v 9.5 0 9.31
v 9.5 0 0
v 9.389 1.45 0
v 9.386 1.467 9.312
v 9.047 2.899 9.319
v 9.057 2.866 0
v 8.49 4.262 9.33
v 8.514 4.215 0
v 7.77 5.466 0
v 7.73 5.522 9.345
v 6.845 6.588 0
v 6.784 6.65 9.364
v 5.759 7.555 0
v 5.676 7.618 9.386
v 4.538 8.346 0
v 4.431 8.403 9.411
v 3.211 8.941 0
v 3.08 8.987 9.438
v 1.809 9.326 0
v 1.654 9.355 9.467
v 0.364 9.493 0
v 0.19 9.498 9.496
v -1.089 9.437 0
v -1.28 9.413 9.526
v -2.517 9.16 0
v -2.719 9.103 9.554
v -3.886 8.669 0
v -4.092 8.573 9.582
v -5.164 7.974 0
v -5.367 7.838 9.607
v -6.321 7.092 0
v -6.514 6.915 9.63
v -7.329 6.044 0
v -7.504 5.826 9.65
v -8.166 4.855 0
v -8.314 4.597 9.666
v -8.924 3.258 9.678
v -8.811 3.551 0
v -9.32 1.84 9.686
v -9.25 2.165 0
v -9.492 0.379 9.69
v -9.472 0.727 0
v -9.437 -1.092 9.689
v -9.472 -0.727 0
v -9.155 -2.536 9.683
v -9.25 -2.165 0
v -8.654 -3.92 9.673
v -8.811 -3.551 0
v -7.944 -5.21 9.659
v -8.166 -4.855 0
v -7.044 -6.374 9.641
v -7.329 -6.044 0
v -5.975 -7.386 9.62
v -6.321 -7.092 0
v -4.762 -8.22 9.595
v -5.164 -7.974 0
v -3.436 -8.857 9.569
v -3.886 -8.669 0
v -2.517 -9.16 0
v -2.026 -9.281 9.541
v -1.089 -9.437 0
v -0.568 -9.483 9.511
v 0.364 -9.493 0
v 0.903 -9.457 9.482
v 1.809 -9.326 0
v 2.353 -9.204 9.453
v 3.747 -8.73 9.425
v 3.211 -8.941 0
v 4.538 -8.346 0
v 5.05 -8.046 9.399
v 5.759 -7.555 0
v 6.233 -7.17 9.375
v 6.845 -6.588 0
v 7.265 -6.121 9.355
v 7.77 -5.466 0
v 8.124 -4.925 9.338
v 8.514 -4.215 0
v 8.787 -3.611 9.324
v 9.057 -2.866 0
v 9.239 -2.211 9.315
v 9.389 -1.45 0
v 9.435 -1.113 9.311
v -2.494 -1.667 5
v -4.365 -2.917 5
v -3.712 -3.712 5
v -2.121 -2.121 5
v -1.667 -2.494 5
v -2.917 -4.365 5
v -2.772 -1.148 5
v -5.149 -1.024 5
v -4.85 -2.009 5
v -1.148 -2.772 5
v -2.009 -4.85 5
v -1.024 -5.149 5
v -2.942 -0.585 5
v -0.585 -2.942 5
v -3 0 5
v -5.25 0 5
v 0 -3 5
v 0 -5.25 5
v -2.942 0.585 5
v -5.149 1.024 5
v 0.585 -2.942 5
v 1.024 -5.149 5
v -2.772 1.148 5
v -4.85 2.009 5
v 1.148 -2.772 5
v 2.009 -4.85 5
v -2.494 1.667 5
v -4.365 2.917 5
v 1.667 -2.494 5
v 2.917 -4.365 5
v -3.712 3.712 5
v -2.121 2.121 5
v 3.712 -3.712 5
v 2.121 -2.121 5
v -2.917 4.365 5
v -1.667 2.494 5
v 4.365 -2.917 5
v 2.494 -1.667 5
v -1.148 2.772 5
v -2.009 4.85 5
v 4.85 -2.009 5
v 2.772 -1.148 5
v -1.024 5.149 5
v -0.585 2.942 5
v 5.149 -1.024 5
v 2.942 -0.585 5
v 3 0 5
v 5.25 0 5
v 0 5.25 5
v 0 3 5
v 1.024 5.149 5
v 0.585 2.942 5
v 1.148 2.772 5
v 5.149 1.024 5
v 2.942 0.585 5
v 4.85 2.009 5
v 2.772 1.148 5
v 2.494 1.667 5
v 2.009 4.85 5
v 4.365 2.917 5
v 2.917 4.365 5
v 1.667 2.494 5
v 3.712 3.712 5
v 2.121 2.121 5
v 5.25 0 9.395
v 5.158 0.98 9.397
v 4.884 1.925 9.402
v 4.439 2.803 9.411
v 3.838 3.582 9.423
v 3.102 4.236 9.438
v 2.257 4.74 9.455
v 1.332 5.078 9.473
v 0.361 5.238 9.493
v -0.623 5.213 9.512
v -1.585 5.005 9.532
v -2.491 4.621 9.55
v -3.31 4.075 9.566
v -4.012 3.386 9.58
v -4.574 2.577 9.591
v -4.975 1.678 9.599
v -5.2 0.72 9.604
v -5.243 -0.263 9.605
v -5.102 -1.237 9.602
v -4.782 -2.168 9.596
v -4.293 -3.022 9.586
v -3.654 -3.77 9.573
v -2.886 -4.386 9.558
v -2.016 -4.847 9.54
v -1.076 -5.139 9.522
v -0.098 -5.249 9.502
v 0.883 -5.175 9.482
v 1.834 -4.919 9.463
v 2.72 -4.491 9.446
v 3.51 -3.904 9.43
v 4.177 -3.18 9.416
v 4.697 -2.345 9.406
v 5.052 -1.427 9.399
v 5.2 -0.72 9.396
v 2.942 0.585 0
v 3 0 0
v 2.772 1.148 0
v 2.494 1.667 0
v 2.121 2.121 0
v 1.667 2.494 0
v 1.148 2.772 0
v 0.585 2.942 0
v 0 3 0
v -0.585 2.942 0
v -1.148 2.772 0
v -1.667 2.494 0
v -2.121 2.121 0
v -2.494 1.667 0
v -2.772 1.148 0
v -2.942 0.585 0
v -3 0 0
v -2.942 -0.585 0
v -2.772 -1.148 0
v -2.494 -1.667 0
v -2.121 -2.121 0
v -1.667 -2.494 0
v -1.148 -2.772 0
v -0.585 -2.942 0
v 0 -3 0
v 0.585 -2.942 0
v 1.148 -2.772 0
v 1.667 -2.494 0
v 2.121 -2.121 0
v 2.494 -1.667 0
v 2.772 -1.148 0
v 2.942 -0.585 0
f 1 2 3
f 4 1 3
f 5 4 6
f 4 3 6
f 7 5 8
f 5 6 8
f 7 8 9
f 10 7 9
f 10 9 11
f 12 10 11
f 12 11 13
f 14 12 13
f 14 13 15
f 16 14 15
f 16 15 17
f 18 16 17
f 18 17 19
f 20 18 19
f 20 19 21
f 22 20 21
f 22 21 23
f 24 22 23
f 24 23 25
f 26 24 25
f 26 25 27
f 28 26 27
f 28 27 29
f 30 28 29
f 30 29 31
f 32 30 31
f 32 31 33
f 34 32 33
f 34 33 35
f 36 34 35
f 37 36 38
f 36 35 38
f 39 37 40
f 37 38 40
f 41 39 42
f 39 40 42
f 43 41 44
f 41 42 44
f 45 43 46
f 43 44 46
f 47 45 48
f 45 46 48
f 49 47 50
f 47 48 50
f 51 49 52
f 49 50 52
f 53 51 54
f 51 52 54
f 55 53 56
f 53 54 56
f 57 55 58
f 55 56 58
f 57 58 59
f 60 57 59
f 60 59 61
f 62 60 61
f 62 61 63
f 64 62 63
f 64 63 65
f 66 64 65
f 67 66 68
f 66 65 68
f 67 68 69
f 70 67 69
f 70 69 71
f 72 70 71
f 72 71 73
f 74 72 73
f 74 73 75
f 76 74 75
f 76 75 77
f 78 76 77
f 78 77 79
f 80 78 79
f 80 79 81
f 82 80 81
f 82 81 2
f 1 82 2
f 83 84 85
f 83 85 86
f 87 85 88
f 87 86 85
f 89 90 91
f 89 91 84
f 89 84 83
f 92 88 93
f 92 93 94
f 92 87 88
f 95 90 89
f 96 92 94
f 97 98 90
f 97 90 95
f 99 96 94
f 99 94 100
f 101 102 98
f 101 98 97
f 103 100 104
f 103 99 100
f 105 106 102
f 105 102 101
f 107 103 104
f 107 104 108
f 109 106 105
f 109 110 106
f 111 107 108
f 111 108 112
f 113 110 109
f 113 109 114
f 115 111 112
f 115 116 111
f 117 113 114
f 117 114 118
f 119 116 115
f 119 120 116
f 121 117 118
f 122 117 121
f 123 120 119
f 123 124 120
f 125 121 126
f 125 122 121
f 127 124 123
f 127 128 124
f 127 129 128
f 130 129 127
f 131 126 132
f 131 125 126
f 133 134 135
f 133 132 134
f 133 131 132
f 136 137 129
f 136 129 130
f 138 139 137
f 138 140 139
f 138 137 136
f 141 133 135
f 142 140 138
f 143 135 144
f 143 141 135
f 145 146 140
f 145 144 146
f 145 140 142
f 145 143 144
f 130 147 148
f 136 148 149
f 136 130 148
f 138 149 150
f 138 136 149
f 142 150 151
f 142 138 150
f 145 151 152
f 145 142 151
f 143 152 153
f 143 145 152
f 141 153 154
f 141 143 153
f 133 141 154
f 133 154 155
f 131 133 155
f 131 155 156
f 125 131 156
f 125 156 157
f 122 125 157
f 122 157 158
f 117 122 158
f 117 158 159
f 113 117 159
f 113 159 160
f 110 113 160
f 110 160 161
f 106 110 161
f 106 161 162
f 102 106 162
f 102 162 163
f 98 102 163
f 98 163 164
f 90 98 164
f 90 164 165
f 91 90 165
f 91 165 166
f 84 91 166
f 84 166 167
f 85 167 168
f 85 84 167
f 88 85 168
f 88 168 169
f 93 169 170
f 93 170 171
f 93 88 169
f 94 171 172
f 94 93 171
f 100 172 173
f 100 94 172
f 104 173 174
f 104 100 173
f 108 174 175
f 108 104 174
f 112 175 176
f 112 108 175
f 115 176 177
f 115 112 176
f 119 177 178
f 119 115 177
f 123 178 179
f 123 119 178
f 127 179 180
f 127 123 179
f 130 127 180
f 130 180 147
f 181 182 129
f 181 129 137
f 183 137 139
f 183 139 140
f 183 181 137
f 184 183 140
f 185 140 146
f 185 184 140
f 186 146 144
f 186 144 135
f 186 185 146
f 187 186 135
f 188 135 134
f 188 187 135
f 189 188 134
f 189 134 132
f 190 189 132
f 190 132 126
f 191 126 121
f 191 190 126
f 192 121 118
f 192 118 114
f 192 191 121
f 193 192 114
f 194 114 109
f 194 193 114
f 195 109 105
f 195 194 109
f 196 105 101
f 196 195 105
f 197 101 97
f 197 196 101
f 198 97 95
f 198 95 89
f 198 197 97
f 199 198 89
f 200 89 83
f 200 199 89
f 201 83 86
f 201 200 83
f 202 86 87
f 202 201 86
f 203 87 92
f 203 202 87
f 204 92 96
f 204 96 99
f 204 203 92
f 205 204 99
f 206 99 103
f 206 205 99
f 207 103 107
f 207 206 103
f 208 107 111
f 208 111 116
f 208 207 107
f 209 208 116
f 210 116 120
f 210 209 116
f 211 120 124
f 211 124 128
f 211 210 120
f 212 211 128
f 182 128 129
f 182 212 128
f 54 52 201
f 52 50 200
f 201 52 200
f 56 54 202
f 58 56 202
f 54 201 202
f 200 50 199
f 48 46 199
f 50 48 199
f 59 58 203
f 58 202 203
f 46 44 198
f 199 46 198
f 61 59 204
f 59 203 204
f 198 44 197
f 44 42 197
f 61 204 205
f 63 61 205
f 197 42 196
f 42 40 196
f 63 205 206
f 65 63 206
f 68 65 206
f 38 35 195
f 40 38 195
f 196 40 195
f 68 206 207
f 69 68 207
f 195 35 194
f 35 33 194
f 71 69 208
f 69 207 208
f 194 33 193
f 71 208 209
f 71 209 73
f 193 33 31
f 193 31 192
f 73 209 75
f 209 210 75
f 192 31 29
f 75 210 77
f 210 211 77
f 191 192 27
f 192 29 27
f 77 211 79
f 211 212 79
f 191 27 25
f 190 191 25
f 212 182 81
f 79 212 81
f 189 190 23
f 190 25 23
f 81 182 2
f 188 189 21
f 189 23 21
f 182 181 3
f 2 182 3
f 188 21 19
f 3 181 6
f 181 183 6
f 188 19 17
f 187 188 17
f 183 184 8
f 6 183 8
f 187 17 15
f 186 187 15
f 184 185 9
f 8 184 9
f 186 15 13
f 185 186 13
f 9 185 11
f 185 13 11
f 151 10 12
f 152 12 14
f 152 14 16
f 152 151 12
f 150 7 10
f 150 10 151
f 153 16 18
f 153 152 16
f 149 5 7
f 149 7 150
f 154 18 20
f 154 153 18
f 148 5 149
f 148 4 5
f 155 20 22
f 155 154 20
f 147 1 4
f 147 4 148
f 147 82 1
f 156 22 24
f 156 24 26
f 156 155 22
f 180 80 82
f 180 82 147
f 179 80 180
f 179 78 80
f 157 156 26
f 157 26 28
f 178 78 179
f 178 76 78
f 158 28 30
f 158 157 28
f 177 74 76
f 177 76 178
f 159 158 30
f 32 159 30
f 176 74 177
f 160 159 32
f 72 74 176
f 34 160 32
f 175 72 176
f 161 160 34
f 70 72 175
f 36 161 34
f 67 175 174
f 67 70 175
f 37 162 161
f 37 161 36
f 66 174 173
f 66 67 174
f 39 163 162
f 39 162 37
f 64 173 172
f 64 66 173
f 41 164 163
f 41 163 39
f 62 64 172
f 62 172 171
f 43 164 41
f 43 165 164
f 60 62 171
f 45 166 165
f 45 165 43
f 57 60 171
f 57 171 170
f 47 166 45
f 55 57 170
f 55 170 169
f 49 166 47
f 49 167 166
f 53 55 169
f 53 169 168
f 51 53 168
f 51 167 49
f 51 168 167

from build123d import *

# Parameters (mm, degrees)
F0_R     = 9.5
F0_R_2   = 5.25
F1_DEPTH = 10
F2_R     = 5.25
F2_R_2   = 3
F3_DEPTH = 5
F5_DEPTH = 12.5


with BuildPart() as f1:
    # F0 (on Top) → F1 (new body)
    with BuildSketch(Plane.XY):
        Circle(F0_R)
        Circle(F0_R_2, mode=Mode.SUBTRACT)
    extrude(amount=F1_DEPTH)

    # F2 (on Top) → F3 (join)
    with BuildSketch(Plane.XY):
        Circle(F2_R)
        Circle(F2_R_2, mode=Mode.SUBTRACT)
    extrude(amount=F3_DEPTH)

    # F4 (on Front) → F5 (intersect, symmetric)
    with BuildSketch(Plane.XZ):
        Polygon((25, 9), (-25, 10), (-25, 0), (25, 0), align=None)
    extrude(amount=F5_DEPTH, both=True, mode=Mode.INTERSECT)


solid = f1.part
